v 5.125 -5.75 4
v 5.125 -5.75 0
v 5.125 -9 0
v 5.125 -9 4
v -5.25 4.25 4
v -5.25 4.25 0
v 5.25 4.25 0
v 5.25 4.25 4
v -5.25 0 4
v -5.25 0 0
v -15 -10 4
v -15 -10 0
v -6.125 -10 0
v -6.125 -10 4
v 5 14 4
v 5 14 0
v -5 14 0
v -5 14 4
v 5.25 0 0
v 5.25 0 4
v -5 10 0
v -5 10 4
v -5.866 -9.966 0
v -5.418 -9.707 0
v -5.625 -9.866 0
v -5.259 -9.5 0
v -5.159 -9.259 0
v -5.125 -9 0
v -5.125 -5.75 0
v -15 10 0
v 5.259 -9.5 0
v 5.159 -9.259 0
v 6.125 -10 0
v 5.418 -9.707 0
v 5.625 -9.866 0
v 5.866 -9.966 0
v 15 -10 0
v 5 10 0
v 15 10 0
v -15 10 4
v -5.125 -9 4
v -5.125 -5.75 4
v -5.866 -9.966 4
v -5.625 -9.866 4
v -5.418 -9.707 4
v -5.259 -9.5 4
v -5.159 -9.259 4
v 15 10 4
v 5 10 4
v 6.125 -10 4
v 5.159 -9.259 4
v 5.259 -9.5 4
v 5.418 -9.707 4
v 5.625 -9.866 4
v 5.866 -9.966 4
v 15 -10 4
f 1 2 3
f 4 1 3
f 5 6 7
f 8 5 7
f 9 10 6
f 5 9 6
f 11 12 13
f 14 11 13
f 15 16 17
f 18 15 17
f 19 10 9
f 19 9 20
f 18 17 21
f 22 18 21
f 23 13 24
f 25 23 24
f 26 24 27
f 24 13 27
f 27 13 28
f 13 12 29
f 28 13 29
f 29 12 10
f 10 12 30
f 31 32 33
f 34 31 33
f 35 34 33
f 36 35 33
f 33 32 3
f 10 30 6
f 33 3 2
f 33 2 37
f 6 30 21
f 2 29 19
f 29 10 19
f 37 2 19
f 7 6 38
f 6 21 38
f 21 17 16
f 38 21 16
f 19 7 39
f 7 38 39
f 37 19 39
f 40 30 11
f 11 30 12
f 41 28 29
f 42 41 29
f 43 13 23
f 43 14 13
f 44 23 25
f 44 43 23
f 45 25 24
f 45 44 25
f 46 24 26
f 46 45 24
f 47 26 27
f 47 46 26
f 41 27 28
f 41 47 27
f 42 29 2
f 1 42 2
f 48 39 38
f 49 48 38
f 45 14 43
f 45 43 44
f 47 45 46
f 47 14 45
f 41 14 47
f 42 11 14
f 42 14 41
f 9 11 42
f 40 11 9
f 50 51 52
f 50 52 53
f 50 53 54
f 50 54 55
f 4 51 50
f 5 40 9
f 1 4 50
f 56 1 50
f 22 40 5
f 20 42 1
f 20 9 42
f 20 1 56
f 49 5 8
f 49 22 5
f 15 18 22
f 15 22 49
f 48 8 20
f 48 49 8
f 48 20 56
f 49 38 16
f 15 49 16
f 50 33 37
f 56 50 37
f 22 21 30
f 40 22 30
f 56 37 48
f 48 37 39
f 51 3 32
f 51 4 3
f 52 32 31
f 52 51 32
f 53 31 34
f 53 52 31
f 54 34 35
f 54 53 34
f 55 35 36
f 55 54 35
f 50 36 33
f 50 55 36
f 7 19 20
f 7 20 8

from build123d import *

# Parameters (mm, degrees)
SKETCH_W  = 10.5
SKETCH_H  = 4.25
PAD_DEPTH = 4
FILLET_R  = 1


with BuildPart() as part:
    # Sketch → Pad (new body)
    with BuildSketch(Plane.XY):
        Polygon((-15, 10), (-15, -10), (-5.125, -10), (-5.125, -5.75), (5.125, -5.75), (5.125, -10), (15, -10), (15, 10), (5, 10), (5, 14), (-5, 14), (-5, 10), align=None)
        with Locations((0, 2.125)):
            Rectangle(SKETCH_W, SKETCH_H, mode=Mode.SUBTRACT)
    extrude(amount=PAD_DEPTH)

    # Fillet
    fillet_edges = [part.edges().sort_by_distance(p)[0] for p in [
        (-5.125, -10, 2),
        (5.125, -10, 2),
    ]]
    fillet(fillet_edges, radius=FILLET_R)


solid = part.part
